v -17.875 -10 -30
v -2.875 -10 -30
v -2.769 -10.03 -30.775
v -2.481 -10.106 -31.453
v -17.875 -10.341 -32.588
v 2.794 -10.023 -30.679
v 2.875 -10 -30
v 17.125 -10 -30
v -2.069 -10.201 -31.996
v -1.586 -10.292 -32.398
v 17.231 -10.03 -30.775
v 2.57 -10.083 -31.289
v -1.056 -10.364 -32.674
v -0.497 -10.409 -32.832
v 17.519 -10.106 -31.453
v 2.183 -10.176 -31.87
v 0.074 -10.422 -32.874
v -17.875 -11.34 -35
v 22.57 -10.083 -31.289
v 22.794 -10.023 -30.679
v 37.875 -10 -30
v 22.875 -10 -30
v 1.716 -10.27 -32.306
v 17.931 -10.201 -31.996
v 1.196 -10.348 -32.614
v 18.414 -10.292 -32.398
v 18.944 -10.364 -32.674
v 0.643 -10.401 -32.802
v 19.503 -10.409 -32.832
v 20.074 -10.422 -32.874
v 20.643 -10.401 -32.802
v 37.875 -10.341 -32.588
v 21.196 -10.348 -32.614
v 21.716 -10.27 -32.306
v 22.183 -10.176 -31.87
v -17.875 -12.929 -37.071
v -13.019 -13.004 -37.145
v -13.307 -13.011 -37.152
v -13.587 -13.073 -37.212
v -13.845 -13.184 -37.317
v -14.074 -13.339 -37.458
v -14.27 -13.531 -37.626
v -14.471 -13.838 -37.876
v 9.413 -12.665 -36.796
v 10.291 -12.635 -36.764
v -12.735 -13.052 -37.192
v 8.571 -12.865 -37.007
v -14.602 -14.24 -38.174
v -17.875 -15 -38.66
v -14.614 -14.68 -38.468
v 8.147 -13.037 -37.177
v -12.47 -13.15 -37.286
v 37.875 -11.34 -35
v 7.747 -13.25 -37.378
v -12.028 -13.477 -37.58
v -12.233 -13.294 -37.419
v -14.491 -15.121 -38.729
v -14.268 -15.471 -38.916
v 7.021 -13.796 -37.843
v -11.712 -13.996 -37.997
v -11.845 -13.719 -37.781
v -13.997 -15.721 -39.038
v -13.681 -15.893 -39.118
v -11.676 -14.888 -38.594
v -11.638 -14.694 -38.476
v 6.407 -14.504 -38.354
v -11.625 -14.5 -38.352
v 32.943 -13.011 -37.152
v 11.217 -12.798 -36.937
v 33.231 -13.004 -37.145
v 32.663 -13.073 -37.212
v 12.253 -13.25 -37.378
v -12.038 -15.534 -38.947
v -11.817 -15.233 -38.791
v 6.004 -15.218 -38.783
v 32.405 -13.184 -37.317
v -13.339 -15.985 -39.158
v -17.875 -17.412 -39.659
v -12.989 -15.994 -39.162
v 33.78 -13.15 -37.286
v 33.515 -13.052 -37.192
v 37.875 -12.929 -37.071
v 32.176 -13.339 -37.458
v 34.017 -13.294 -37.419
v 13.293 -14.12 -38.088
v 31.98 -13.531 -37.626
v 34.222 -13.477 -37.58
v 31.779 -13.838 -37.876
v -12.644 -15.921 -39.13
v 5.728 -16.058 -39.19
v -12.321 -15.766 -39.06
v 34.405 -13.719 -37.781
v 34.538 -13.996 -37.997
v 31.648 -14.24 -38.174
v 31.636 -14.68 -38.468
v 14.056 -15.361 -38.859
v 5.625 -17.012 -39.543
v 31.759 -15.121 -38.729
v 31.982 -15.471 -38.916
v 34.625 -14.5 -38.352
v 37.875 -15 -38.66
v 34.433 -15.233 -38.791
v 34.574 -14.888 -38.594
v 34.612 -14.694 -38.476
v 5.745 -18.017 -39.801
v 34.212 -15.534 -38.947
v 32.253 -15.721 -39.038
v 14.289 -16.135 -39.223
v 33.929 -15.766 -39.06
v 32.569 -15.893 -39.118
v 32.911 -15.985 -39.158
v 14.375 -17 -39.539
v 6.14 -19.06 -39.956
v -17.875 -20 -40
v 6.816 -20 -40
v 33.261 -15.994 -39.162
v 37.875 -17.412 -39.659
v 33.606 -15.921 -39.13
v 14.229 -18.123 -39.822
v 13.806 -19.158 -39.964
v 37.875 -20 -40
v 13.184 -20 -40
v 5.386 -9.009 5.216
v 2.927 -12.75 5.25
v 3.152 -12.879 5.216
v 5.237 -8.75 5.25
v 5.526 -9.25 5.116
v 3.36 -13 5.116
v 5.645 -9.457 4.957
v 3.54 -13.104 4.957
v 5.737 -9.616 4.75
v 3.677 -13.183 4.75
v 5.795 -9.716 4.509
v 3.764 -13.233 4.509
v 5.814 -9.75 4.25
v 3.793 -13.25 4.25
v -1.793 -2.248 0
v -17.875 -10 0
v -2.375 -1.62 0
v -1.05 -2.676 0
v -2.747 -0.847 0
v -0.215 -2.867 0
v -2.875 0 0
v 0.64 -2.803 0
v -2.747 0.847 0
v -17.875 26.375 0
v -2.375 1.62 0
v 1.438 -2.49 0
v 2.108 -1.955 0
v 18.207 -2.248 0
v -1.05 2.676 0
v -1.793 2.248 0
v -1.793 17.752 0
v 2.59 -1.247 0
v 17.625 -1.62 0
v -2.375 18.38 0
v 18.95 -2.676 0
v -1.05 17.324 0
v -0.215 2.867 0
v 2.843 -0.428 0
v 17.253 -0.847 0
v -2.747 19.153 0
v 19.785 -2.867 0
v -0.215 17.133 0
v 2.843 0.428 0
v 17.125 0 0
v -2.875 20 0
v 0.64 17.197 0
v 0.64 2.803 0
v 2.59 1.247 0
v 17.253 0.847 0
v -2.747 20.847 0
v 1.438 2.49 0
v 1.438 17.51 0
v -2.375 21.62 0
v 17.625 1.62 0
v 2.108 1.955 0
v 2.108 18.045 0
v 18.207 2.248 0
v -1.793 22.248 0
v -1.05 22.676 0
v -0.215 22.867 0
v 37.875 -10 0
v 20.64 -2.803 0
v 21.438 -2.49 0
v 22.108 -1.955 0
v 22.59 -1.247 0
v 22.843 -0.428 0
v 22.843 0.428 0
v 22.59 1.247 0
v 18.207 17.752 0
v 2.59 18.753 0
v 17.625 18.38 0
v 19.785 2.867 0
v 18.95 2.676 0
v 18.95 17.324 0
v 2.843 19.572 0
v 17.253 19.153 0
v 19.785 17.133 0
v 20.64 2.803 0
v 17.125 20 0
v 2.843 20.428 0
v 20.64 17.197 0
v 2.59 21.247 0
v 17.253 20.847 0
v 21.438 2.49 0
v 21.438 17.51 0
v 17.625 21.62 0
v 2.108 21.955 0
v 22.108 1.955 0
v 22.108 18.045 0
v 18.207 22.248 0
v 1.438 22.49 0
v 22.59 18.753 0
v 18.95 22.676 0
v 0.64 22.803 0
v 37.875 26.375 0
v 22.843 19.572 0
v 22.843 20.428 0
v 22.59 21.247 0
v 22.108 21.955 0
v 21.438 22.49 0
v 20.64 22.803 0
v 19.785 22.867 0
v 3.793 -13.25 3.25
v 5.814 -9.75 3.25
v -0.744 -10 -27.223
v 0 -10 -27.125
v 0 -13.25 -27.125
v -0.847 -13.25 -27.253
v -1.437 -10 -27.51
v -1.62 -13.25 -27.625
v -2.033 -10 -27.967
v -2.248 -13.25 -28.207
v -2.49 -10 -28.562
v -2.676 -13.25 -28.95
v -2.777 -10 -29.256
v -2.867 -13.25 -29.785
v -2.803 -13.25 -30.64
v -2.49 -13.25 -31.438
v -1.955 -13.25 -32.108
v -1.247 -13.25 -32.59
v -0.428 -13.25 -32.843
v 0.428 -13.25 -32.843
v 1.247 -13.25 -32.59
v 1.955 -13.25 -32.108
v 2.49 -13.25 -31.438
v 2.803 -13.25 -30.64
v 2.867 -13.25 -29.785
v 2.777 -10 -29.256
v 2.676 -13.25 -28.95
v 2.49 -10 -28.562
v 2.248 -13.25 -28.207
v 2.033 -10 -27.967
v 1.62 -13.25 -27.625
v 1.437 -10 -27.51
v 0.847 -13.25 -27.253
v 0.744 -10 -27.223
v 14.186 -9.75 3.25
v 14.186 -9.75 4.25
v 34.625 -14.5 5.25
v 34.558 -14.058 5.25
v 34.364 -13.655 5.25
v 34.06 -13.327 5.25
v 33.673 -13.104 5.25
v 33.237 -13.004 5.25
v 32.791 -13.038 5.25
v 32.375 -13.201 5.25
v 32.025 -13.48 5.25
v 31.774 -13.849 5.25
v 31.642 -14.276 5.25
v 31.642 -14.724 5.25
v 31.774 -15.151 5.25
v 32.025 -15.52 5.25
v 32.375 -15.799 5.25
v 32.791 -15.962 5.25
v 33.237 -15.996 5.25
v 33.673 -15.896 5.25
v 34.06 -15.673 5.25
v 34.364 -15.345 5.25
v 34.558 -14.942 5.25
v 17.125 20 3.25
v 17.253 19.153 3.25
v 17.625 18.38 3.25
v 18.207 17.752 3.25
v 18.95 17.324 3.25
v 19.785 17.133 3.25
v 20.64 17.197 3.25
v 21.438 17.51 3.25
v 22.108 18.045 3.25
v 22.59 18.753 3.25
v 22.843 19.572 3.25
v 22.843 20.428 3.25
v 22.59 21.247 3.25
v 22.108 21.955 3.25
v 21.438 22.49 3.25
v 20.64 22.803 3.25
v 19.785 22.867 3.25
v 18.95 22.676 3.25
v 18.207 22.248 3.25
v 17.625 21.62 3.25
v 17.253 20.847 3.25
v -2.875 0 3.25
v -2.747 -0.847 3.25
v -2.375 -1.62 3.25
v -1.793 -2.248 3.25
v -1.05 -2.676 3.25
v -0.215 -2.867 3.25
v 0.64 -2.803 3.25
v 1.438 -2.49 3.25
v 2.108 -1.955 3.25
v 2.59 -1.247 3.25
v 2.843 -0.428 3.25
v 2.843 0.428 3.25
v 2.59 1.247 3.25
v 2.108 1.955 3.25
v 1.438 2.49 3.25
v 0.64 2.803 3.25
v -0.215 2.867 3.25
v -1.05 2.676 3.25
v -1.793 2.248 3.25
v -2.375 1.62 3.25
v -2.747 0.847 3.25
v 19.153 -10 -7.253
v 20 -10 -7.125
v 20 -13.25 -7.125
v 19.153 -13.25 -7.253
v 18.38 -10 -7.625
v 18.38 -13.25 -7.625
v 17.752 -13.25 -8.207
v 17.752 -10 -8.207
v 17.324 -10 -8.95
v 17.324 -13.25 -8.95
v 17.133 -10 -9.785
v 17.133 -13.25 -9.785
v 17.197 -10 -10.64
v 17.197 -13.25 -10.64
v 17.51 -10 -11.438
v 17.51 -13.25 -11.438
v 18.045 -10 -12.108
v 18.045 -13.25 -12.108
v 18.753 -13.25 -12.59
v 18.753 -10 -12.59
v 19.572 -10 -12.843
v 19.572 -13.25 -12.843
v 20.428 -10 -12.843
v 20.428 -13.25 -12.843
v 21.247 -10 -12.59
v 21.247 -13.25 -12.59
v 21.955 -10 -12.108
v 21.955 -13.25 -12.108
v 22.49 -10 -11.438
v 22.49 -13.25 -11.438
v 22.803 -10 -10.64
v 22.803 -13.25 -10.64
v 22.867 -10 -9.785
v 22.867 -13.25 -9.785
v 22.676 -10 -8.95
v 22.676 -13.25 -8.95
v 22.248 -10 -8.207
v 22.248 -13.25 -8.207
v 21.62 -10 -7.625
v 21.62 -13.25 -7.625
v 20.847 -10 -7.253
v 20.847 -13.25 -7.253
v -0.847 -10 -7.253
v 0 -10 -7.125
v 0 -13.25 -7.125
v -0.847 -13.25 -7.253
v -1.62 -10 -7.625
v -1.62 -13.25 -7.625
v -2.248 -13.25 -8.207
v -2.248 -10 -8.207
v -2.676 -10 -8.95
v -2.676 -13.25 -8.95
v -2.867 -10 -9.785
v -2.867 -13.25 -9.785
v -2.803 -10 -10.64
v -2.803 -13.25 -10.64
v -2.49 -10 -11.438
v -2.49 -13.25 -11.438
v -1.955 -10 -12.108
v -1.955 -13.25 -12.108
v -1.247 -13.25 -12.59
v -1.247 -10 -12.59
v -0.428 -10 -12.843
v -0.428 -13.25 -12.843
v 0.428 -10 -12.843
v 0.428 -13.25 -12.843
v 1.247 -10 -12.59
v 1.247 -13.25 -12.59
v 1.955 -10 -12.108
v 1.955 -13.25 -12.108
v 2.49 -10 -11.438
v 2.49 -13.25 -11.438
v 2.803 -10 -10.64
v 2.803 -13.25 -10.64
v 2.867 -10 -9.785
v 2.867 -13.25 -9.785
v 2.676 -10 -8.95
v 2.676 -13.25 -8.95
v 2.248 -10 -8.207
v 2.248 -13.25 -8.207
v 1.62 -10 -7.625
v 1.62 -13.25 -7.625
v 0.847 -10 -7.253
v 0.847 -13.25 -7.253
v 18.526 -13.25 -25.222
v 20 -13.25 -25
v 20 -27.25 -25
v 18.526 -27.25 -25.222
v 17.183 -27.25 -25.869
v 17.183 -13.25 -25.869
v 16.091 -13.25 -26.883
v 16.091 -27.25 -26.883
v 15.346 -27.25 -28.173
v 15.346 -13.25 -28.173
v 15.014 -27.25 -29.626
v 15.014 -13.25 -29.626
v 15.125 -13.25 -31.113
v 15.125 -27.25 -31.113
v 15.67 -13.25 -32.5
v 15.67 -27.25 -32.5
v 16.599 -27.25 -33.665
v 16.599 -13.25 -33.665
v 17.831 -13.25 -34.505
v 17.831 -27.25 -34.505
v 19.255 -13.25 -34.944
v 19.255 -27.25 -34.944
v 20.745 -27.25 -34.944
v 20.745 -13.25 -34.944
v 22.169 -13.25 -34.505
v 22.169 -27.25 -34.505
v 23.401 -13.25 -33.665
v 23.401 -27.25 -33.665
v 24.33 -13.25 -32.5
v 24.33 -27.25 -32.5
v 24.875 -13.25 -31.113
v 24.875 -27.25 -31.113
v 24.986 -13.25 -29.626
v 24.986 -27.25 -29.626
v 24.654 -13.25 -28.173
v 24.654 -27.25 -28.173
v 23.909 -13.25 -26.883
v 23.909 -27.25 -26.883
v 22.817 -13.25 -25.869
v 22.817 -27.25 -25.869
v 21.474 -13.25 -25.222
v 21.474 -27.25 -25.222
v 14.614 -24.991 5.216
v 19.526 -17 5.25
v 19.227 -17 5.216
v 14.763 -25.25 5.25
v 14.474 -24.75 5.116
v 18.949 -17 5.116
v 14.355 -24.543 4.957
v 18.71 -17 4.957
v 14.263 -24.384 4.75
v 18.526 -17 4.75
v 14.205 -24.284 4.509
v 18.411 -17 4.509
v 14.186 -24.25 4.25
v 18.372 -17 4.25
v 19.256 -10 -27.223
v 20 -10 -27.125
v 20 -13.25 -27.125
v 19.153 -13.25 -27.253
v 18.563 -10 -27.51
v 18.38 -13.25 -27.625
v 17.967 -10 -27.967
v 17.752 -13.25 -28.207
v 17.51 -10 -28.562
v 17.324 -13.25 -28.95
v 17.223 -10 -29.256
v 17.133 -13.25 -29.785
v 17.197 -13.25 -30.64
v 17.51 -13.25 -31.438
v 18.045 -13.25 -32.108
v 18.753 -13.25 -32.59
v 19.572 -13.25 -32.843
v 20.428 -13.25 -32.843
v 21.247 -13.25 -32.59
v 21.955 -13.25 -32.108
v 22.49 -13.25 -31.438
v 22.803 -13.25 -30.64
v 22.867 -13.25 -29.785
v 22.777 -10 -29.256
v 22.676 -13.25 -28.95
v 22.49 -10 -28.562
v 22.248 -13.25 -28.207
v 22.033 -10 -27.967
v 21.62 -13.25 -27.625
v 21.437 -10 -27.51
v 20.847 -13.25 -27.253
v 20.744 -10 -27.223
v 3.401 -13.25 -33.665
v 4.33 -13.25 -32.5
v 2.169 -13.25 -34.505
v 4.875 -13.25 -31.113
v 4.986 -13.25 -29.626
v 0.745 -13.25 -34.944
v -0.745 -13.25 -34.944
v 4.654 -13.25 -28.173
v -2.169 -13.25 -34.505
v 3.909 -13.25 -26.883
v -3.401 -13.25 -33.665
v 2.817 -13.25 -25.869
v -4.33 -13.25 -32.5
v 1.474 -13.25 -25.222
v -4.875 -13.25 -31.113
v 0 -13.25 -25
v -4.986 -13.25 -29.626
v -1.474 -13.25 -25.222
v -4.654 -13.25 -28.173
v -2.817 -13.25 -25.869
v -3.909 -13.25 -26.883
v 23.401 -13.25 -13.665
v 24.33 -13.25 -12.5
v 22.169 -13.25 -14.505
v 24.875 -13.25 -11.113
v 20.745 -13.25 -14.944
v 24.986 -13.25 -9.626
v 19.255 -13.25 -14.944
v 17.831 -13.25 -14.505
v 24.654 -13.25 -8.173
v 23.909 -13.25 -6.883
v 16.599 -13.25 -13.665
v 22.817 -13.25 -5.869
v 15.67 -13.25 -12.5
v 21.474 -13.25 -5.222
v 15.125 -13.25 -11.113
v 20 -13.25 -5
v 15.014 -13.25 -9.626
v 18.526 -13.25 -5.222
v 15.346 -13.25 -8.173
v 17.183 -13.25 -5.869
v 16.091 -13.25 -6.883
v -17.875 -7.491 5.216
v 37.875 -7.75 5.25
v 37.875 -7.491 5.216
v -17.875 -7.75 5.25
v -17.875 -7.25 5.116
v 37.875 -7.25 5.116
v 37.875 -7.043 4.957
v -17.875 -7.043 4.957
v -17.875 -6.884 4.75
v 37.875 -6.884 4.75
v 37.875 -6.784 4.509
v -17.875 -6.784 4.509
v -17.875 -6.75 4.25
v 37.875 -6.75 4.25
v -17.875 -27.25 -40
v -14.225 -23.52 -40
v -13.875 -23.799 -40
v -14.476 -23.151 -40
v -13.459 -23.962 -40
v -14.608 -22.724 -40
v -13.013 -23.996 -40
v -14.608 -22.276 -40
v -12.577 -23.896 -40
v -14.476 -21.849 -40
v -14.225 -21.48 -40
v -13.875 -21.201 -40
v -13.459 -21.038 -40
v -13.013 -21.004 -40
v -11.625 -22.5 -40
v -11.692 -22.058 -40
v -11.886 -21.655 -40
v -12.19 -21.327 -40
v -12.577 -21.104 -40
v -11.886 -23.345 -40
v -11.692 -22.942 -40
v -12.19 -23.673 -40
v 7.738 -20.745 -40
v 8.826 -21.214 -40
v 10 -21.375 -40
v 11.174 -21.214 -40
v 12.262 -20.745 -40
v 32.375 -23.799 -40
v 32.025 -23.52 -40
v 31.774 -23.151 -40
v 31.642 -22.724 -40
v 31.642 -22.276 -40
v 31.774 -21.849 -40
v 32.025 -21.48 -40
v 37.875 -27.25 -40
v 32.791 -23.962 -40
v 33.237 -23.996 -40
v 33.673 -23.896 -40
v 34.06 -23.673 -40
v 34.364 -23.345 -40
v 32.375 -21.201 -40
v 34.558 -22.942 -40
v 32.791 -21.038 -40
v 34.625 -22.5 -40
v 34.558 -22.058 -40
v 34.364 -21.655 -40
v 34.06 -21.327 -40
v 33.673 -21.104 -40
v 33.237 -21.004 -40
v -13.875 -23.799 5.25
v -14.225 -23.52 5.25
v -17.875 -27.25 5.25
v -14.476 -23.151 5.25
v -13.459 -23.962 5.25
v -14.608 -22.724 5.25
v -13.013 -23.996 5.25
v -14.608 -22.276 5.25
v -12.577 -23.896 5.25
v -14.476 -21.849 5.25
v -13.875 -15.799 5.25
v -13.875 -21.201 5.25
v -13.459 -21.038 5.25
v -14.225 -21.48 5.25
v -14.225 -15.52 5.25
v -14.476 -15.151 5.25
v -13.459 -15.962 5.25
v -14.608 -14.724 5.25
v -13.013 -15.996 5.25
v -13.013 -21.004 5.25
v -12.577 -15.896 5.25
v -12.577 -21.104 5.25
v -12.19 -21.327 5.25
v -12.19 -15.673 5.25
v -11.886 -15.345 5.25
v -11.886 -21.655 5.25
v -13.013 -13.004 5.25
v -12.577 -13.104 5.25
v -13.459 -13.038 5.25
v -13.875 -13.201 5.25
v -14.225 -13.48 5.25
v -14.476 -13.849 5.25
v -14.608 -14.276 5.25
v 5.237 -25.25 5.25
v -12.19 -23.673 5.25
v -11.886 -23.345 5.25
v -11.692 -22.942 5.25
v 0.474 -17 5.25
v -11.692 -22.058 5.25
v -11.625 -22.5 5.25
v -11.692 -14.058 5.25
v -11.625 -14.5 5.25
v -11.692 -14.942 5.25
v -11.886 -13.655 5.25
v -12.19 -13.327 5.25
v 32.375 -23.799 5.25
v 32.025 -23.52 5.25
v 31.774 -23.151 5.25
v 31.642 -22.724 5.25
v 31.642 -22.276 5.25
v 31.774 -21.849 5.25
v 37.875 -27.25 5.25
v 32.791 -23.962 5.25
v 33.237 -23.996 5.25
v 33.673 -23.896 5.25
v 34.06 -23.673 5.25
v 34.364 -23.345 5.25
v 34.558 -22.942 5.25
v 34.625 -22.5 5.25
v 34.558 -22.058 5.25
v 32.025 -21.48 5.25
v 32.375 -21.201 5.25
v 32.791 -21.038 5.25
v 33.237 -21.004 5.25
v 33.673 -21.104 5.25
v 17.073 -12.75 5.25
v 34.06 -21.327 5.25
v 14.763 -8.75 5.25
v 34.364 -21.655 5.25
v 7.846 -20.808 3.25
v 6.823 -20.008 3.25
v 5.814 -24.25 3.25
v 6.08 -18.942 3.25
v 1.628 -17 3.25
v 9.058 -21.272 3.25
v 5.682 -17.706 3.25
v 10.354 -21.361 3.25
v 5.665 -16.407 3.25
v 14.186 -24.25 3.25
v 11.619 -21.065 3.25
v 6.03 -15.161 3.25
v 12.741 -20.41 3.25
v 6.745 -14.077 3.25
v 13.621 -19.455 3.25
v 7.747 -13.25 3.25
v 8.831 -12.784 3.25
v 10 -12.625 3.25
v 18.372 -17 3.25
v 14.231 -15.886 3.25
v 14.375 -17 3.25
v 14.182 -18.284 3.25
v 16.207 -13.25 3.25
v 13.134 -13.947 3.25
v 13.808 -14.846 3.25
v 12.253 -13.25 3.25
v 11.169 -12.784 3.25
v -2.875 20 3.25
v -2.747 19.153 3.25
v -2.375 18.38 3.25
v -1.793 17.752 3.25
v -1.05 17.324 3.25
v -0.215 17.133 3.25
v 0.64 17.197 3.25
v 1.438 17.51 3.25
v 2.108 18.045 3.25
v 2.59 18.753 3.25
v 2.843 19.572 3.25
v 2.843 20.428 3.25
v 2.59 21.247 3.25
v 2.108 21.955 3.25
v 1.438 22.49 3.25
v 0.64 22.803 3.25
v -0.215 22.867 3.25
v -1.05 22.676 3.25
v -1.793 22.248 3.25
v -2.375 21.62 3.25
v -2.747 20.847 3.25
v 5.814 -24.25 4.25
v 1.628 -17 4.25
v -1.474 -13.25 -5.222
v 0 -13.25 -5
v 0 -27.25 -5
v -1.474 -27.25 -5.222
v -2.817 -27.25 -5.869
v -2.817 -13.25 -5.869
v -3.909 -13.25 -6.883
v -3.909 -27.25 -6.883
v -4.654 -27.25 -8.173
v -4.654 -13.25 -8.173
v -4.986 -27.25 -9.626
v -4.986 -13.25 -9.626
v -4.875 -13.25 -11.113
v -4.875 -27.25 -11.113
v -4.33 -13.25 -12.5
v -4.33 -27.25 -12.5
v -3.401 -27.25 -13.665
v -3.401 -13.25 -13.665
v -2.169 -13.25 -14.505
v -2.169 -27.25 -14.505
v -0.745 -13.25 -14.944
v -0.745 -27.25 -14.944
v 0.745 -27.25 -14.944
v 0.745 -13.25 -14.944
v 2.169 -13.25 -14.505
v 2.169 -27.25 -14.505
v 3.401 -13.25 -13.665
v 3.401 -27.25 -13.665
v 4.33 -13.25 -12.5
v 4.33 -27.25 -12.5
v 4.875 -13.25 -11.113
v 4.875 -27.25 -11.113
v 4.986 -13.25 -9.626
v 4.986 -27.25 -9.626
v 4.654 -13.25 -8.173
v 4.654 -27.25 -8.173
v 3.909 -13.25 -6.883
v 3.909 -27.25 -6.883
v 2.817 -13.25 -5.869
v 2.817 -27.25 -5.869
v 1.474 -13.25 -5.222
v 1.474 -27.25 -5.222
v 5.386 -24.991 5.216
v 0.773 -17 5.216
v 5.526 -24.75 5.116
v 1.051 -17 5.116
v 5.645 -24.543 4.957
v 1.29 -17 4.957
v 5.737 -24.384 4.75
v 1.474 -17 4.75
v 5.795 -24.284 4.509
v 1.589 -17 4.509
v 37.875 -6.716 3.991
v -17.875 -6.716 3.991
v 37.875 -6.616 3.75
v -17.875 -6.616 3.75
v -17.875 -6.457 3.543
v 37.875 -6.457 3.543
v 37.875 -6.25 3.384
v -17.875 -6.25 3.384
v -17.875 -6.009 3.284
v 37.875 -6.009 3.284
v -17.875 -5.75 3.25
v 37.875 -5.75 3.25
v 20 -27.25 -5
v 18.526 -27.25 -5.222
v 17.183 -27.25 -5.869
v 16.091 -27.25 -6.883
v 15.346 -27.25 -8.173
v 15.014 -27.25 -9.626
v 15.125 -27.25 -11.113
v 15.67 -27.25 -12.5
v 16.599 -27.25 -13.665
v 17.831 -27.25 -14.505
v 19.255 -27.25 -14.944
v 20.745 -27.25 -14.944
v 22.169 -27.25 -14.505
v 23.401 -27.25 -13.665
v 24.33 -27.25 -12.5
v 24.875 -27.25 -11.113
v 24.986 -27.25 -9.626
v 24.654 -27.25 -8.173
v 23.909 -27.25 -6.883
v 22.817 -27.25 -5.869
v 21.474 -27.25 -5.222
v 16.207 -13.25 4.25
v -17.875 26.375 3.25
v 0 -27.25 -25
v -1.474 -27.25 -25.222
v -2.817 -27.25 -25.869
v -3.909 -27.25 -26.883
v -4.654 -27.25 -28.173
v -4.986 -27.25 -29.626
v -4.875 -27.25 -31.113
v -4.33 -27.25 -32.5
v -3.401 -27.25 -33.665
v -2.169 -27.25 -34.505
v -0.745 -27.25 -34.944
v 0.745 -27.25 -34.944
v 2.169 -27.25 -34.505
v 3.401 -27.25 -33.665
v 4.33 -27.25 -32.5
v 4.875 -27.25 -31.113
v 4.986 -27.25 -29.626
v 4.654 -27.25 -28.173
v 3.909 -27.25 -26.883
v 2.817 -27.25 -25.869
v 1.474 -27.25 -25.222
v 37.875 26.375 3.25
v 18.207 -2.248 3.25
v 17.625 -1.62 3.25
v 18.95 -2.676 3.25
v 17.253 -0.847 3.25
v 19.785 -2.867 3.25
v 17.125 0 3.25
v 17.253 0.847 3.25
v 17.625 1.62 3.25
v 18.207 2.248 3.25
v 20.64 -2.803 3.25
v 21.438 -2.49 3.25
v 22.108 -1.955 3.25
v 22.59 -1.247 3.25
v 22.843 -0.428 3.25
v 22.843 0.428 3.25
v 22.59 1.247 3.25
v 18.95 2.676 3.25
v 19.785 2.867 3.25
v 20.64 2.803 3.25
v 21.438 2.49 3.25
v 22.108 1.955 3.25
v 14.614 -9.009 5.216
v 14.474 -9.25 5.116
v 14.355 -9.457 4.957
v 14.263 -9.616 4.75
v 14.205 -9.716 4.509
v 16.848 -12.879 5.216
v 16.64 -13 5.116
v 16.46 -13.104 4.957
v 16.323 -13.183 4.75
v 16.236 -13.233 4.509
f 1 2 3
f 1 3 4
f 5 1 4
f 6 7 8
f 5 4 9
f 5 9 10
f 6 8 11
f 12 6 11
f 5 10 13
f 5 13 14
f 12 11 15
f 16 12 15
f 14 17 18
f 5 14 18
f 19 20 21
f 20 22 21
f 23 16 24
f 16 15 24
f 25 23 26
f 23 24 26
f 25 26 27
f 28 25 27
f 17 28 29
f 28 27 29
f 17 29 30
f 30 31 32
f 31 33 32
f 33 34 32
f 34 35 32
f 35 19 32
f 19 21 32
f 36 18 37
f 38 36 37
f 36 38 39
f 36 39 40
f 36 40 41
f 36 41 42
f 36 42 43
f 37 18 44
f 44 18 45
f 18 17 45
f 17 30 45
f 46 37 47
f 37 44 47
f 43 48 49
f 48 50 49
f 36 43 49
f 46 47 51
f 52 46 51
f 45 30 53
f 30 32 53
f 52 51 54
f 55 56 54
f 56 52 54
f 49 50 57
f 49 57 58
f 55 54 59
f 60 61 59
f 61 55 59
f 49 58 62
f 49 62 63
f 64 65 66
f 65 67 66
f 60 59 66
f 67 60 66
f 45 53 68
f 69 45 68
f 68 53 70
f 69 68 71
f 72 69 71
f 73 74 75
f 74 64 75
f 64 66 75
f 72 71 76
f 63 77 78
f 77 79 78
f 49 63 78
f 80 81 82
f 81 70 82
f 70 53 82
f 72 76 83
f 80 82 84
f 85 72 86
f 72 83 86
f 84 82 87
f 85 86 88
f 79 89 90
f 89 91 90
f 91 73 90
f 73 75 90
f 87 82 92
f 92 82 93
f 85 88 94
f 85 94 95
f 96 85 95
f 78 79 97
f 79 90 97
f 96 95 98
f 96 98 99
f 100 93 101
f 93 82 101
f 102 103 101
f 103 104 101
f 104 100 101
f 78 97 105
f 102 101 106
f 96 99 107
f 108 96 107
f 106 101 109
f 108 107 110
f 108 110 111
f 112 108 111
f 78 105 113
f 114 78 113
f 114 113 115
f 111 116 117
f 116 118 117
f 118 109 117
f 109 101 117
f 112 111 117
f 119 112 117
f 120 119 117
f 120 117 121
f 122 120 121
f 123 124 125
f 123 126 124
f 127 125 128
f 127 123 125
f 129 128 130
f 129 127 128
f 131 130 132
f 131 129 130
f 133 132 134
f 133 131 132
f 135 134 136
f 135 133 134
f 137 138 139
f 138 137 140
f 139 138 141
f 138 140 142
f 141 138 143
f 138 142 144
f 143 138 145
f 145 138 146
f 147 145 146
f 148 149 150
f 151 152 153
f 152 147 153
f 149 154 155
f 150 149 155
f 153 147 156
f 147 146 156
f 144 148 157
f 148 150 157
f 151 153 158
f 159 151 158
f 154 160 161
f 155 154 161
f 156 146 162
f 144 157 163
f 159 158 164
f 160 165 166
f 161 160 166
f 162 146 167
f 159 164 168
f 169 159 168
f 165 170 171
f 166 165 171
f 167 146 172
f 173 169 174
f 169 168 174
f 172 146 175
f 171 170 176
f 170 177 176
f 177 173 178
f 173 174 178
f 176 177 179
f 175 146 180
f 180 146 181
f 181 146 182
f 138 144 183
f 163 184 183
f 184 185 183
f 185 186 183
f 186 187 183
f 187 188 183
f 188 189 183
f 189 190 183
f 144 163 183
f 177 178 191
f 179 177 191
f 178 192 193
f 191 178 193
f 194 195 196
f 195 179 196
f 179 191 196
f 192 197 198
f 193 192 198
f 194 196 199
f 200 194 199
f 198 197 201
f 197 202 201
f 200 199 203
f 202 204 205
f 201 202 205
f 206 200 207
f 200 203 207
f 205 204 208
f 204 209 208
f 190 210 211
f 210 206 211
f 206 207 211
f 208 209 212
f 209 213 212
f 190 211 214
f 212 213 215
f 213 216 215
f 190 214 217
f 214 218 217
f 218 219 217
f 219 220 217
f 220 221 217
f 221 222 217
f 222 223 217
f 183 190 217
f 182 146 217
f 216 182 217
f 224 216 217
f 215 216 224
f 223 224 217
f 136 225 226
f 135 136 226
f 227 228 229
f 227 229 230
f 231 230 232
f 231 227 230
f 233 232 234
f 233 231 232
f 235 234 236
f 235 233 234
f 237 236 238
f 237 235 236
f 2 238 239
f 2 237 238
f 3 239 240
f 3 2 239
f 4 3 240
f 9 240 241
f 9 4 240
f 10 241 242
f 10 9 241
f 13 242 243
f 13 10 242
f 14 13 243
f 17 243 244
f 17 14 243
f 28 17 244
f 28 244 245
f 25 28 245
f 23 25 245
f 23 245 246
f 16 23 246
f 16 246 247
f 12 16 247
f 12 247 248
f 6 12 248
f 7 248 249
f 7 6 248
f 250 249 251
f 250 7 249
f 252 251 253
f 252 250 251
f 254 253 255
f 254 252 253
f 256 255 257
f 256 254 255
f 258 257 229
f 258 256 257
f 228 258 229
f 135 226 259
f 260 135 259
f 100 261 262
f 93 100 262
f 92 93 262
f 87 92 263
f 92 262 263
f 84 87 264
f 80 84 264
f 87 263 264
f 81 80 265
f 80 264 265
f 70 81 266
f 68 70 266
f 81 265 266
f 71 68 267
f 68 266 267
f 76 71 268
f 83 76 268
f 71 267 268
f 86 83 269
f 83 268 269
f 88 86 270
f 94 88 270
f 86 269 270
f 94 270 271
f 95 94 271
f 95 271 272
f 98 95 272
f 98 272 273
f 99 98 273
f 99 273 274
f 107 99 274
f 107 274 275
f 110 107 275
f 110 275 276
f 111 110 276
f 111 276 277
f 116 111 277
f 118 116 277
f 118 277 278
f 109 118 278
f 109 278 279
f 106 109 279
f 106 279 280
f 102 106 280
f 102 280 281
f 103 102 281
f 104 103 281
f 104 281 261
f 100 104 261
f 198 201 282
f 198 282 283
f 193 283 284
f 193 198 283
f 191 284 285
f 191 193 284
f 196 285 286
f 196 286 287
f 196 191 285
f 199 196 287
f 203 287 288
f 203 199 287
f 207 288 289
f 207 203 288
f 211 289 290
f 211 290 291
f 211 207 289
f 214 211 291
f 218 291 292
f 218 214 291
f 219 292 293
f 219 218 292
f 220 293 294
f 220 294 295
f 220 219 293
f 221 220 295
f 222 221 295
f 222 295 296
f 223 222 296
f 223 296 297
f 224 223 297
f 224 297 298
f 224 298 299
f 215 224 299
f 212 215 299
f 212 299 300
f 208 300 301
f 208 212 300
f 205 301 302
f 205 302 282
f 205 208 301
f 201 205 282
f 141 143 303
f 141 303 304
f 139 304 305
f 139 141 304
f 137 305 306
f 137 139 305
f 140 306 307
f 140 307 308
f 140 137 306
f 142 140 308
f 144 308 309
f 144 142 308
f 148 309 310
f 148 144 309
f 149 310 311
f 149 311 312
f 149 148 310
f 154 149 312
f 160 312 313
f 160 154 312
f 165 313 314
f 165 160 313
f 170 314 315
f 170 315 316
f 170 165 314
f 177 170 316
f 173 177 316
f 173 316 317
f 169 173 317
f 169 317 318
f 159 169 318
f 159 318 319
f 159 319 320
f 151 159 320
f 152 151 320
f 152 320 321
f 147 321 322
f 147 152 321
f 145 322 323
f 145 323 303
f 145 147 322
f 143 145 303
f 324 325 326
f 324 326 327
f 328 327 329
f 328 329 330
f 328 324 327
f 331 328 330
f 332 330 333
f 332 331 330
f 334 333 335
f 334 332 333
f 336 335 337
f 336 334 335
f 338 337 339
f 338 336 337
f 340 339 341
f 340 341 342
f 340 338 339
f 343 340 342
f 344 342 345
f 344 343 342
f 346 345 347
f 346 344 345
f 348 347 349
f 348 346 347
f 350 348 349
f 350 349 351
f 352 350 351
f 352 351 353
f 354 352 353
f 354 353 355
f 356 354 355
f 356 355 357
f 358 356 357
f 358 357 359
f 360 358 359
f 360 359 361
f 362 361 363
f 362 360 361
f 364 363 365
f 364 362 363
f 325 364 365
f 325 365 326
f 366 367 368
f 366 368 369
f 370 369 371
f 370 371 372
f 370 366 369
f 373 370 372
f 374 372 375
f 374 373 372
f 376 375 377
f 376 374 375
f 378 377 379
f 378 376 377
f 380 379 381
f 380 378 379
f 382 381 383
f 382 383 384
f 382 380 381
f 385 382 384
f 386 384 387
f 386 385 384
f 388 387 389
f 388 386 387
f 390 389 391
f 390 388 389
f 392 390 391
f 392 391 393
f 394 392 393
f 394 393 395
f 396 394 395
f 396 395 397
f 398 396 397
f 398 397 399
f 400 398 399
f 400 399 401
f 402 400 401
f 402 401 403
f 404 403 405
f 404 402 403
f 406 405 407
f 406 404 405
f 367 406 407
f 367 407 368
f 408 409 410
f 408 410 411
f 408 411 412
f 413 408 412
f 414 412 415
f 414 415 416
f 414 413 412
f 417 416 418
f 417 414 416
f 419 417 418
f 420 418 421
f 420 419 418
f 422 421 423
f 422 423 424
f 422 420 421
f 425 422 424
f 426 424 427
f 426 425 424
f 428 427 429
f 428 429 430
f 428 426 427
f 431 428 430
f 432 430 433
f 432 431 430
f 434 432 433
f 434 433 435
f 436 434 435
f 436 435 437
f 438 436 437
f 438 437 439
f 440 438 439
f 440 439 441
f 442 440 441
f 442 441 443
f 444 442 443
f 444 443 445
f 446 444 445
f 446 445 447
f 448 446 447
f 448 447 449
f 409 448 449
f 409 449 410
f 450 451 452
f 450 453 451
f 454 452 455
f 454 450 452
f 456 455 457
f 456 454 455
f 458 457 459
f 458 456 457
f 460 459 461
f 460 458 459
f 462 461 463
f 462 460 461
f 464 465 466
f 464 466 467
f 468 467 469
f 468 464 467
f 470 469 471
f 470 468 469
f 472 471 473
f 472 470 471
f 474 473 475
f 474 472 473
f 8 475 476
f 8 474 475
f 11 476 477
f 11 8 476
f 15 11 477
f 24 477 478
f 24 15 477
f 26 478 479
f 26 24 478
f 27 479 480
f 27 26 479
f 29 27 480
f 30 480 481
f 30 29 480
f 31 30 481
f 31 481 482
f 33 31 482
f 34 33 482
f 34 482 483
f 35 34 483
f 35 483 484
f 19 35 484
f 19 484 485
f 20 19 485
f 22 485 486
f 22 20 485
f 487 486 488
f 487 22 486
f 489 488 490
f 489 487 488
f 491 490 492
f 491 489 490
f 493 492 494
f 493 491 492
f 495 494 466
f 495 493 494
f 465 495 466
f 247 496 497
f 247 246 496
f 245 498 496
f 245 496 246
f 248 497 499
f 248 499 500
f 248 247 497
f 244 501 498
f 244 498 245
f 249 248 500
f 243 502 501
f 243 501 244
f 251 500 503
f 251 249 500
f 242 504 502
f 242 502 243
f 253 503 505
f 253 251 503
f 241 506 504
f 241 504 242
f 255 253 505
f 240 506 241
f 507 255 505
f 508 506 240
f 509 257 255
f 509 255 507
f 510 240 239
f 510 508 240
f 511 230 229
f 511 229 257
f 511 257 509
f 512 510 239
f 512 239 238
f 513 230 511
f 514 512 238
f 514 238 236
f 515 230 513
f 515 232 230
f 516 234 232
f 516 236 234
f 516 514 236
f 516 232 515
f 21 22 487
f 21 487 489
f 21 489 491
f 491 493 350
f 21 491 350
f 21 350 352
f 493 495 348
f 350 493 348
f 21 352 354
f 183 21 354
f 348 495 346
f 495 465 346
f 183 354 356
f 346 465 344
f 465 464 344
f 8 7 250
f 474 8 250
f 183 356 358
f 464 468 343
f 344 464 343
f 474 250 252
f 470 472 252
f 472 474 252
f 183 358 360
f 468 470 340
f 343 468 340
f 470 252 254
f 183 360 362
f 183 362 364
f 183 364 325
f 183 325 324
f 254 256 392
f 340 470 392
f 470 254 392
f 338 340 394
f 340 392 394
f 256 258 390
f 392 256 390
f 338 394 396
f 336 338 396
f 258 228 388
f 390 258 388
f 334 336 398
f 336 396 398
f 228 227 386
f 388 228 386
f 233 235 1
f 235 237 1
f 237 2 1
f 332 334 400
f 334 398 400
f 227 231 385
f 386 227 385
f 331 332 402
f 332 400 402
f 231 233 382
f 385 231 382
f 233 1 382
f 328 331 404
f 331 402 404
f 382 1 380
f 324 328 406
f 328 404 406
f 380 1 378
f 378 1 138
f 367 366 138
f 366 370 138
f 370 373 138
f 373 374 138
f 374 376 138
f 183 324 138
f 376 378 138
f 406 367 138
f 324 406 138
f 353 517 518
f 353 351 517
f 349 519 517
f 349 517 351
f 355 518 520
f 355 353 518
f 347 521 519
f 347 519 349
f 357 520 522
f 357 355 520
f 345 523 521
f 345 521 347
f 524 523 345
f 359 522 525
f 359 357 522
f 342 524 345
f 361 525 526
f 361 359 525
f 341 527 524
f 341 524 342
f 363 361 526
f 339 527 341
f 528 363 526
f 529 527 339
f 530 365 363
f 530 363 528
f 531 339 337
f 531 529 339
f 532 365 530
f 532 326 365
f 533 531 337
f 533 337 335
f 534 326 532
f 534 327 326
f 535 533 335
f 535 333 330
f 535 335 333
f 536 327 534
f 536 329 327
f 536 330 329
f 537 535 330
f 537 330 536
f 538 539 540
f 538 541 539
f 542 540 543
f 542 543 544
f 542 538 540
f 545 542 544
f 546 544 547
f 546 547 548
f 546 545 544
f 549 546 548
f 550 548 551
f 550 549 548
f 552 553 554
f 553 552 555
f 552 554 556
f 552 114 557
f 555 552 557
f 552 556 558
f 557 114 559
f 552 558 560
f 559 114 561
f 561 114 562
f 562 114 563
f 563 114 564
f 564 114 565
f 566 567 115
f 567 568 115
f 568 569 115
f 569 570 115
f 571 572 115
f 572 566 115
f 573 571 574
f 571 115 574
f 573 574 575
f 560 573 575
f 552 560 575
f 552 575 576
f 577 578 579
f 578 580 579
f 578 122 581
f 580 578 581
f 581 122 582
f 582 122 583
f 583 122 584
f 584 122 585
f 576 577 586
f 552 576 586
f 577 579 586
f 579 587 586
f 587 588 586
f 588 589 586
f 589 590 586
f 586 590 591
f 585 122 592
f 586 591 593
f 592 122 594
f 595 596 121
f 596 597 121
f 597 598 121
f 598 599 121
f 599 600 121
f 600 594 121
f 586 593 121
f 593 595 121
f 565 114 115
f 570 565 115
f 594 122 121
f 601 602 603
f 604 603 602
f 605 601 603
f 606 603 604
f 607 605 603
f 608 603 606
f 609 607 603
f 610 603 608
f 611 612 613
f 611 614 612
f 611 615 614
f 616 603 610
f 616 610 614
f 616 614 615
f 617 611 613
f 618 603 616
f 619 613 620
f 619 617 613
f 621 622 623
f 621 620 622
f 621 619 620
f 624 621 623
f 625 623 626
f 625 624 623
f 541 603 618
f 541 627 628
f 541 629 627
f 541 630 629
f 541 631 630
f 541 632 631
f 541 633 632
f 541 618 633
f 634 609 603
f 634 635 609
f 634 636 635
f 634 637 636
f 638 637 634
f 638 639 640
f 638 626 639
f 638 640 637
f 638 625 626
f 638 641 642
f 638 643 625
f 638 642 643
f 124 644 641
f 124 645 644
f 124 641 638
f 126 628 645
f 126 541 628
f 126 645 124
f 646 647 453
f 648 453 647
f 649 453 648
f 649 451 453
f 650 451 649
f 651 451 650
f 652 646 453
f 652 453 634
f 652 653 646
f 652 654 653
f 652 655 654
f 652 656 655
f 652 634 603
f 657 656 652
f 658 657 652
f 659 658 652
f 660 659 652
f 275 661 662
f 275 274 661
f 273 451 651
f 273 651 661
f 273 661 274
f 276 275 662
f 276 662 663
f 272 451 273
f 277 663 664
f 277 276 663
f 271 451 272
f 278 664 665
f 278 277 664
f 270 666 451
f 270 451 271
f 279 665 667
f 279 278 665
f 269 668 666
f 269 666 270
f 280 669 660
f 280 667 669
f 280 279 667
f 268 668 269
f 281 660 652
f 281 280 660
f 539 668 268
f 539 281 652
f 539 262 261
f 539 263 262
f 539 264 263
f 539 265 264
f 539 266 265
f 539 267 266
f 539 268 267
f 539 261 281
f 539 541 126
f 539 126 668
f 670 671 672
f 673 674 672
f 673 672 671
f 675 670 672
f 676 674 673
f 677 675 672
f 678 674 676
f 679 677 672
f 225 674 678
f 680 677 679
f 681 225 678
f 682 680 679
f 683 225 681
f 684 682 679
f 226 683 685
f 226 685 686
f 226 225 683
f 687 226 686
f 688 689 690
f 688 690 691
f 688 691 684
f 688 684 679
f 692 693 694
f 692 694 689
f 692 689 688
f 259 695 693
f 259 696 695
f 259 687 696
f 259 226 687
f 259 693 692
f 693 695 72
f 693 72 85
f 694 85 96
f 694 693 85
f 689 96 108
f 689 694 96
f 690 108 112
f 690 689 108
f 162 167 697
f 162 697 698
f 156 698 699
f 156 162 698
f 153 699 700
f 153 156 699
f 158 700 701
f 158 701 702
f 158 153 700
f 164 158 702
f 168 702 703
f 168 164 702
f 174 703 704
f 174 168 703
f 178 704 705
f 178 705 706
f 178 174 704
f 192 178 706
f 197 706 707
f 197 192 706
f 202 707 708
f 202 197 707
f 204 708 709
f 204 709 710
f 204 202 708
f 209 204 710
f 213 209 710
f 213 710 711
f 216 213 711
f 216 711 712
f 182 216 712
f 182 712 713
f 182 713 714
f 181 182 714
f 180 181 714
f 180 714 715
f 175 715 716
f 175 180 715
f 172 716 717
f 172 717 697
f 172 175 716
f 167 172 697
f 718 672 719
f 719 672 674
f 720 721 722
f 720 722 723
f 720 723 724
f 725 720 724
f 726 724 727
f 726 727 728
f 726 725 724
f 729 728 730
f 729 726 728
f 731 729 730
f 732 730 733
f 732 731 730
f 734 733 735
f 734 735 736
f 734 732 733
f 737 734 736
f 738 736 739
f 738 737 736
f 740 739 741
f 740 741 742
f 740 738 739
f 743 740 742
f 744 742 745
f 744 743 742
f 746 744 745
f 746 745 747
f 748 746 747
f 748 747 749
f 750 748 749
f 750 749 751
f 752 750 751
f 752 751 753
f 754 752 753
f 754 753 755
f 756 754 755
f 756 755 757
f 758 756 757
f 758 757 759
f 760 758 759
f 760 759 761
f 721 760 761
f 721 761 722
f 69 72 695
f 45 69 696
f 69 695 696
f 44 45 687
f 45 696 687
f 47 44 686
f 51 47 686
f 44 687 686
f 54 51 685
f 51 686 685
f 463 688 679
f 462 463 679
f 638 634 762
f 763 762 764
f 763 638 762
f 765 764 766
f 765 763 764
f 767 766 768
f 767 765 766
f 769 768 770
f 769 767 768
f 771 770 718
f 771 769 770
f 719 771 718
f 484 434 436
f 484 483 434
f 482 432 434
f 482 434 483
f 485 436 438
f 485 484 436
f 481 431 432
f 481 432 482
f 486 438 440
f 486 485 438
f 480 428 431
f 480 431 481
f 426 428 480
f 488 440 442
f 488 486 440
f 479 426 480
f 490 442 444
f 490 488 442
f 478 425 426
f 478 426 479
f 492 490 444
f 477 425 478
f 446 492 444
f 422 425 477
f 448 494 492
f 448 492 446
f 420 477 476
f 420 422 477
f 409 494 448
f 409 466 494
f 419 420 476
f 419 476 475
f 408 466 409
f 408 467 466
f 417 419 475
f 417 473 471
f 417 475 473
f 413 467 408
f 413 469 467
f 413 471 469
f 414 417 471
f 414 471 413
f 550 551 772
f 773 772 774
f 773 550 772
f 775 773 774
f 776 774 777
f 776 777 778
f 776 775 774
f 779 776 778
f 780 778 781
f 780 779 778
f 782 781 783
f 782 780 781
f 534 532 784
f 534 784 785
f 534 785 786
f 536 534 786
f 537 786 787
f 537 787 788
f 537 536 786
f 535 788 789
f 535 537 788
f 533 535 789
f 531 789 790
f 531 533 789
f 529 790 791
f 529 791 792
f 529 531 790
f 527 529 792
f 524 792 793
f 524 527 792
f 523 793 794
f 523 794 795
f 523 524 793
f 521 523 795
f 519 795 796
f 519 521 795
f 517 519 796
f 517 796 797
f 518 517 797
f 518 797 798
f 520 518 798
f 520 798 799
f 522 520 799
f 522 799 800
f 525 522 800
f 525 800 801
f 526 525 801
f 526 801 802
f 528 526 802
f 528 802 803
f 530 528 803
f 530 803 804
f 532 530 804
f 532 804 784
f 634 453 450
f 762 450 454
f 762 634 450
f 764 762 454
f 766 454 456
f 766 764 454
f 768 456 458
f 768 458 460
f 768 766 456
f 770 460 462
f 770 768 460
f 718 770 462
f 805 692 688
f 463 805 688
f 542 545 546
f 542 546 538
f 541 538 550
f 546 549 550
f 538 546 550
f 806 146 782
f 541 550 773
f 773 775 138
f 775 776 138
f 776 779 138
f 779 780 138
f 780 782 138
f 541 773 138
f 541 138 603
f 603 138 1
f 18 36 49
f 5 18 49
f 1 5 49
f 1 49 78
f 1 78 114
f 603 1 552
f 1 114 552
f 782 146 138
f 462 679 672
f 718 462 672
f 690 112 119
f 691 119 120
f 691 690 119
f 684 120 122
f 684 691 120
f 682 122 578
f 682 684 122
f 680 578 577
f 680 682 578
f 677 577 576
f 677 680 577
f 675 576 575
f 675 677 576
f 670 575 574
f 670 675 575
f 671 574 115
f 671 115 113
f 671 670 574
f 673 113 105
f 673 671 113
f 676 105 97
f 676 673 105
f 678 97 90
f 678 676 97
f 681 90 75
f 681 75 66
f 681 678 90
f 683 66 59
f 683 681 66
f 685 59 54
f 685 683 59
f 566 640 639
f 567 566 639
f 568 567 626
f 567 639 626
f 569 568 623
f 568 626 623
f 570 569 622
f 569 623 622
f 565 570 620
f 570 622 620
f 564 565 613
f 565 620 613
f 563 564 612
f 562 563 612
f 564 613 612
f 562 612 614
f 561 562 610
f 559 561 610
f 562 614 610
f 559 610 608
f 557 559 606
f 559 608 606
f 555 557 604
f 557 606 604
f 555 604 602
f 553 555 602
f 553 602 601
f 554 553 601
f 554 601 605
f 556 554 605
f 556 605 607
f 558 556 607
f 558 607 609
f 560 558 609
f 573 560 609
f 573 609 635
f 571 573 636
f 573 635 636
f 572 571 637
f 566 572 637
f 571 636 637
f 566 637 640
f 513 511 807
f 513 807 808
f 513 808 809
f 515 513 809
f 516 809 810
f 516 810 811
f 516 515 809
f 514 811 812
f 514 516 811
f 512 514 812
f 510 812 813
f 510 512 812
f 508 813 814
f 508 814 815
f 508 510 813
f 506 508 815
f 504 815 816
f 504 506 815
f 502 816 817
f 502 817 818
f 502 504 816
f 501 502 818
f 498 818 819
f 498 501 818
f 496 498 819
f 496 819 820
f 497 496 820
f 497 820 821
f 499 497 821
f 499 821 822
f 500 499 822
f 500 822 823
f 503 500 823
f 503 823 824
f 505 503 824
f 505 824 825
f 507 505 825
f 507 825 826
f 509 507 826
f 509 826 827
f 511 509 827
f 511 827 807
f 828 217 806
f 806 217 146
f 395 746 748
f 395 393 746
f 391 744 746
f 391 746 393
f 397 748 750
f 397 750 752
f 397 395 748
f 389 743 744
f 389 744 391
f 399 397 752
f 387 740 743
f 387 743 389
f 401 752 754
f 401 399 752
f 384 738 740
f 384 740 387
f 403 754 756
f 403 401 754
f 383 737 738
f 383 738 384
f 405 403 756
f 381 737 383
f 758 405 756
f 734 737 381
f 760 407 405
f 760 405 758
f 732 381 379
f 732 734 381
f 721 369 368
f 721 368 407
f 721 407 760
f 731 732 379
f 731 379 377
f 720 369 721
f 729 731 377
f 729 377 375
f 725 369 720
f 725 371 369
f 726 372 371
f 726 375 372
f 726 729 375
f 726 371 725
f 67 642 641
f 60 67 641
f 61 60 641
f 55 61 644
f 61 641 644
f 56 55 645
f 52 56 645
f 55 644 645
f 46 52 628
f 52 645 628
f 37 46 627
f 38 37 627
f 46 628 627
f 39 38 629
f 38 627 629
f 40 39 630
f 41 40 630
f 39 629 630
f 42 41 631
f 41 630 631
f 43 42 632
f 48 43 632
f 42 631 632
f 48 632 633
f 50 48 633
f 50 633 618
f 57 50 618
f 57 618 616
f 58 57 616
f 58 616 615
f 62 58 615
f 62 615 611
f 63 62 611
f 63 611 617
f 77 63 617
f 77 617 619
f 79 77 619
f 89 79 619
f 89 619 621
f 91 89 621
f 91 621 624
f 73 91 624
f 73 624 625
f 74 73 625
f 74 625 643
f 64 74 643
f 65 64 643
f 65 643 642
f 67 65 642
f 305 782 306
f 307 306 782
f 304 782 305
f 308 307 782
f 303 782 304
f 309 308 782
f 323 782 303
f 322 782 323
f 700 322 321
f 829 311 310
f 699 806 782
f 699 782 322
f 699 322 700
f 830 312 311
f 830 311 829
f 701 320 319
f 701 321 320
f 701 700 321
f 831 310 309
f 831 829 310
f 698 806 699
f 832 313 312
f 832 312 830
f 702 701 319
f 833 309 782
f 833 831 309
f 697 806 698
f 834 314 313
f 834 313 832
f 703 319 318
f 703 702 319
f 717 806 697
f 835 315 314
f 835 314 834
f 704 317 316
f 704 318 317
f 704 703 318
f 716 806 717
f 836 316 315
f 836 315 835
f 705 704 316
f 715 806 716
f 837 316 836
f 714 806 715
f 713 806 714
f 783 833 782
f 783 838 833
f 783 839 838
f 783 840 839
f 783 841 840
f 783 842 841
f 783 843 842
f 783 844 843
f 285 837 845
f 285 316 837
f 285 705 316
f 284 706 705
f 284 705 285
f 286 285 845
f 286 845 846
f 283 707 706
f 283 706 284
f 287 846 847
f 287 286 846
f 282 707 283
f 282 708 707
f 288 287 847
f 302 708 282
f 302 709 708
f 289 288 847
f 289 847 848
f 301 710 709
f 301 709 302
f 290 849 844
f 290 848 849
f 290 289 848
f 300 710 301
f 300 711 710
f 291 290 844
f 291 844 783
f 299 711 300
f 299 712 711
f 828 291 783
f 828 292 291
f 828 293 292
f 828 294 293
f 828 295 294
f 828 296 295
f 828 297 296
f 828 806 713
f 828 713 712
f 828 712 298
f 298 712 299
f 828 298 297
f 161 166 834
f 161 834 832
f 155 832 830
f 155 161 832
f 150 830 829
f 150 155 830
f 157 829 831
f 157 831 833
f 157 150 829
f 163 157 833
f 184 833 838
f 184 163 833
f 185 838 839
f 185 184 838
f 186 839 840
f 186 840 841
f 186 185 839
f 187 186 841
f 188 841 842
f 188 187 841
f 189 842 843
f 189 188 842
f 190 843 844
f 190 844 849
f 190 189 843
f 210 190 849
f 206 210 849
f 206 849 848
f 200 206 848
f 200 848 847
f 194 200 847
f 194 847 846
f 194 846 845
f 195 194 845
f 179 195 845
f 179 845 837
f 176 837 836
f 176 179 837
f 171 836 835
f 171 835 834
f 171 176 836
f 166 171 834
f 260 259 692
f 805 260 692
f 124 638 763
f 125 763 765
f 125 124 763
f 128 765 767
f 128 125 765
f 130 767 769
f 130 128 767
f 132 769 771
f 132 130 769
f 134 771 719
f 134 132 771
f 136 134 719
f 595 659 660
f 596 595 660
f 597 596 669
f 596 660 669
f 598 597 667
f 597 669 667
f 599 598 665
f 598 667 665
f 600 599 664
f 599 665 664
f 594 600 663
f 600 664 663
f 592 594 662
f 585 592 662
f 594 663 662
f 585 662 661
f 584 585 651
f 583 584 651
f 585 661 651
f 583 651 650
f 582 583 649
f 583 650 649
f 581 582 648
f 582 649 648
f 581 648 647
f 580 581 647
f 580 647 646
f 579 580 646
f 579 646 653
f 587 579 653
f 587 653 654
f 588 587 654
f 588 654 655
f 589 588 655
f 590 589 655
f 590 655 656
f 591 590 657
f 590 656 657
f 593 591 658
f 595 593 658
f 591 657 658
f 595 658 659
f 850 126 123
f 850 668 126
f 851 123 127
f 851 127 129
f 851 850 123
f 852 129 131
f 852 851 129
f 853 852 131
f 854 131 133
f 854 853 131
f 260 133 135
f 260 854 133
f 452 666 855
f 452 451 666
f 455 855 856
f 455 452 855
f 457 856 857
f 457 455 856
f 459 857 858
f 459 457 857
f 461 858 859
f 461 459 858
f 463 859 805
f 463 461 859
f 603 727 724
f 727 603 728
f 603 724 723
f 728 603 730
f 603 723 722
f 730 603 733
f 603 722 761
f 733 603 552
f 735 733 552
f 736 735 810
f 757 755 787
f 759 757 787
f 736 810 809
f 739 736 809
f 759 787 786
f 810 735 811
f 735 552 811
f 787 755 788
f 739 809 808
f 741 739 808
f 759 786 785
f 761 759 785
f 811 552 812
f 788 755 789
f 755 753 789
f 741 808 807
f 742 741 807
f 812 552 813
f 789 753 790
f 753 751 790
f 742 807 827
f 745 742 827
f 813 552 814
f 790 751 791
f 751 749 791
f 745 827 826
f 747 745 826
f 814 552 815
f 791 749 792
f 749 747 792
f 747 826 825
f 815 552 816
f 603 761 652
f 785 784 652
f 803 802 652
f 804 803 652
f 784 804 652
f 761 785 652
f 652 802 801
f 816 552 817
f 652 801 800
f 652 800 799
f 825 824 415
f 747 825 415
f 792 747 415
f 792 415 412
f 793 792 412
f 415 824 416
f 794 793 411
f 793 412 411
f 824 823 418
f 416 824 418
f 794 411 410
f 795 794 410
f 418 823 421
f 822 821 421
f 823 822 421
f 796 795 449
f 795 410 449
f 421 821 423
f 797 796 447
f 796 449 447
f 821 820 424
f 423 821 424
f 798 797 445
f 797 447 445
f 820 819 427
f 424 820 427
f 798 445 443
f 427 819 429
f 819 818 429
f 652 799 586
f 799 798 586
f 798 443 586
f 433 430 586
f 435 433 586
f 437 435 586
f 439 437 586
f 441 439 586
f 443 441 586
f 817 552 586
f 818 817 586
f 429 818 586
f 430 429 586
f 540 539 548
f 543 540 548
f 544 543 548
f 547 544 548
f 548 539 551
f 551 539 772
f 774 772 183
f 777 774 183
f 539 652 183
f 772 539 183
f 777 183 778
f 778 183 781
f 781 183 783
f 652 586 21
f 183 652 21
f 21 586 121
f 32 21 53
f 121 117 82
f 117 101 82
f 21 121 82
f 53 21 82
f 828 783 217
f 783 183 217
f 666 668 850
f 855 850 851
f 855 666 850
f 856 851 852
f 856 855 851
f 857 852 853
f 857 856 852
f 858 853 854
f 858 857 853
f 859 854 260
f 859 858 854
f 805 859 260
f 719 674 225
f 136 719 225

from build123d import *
from build123d.topology import SkipClean

# Parameters (mm, degrees)
SKETCH1_R           = 2.875
SKETCH1_W           = 55.75
SKETCH1_H           = 3.25
BOSS_EXTRUDE1_DEPTH = 3.25
SKETCH1_4_W         = 55.75
SKETCH1_4_H         = 3.25
BOSS_EXTRUDE2_DEPTH = 40
CUT_EXTRUDE2_DEPTH  = 43.25
BOSS_EXTRUDE4_DEPTH = 2
BOSS_EXTRUDE5_DEPTH = 43.25
SKETCH2_R           = 5
SKETCH2_R_2         = 2.875
CUT_EXTRUDE1_DEPTH  = 17.25
FILLET1_R           = 1
SKETCH2_3_R         = 5
SKETCH2_3_R_2       = 2.875
BOSS_EXTRUDE6_DEPTH = 3.25
SKETCH4_R           = 1.5
CUT_EXTRUDE4_DEPTH  = 45.25
FILLET4_R           = 1
FILLET5_R           = 10


# Some blends are built 0.0001 mm under size
with BuildPart() as part:
    # Sketch1 → Boss-Extrude1 (new body)
    # profile 1 of 2: a face of its own
    with BuildSketch(Plane.XY):
        Polygon((-17.875, -10), (37.875, -10), (37.875, -6.375), (37.875, 26.375), (-17.875, 26.375), (-17.875, -6.375), align=None)
        with Locations(Location((20, 20, 0), (0, 0, 180))):
            Circle(SKETCH1_R, mode=Mode.SUBTRACT)
        with Locations(Location((20, 0, 0), (0, 0, 180))):
            Circle(SKETCH1_R, mode=Mode.SUBTRACT)
        with Locations(Location((0, 0, 0), (0, 0, 180))):
            Circle(SKETCH1_R, mode=Mode.SUBTRACT)
        with Locations(Location((0, 20, 0), (0, 0, 180))):
            Circle(SKETCH1_R, mode=Mode.SUBTRACT)
    # profile 2 of 2: a face of its own
    with BuildSketch(Plane.XY):
        with Locations((10, -11.625)):
            Rectangle(SKETCH1_W, SKETCH1_H)
    extrude(amount=BOSS_EXTRUDE1_DEPTH)

    # Sketch1<4> → Boss-Extrude2 (add)
    with BuildSketch(Plane.XY):
        with Locations((10, -11.625)):
            Rectangle(SKETCH1_4_W, SKETCH1_4_H)
    extrude(amount=-BOSS_EXTRUDE2_DEPTH)

    # Sketch3 → Cut-Extrude2 (cut)
    with BuildSketch(Plane.XY.offset(3.25)):
        with BuildLine():
            Line((12.253469547, -13.25), (7.746530453, -13.25))
            ThreePointArc((7.746530453, -13.25), (7.84573728, -20.807857289), (14.375, -17))
            ThreePointArc((14.375, -17), (13.807857289, -14.84573728), (12.253469547, -13.25))
        make_face()
        with BuildLine():
            ThreePointArc((12.253469547, -13.25), (10, -12.625), (7.746530453, -13.25))
            Line((7.746530453, -13.25), (12.253469547, -13.25))
        make_face()
    extrude(amount=-CUT_EXTRUDE2_DEPTH, mode=Mode.SUBTRACT)

    # Sketch3<4> → Boss-Extrude4 (add)
    with BuildSketch(Plane.XY.offset(3.25)):
        Polygon((3.793484606, -13.25), (-17.875, -13.25), (-17.875, -27.25), (37.875, -27.25), (37.875, -13.25), (16.206515394, -13.25), (18.371578903, -17), (14.185789452, -24.25), (5.814210548, -24.25), (1.628421097, -17), align=None)
        Polygon((37.875, -6.75), (-17.875, -6.75), (-17.875, -13.25), (3.793484606, -13.25), (5.814210548, -9.75), (14.185789452, -9.75), (16.206515394, -13.25), (37.875, -13.25), align=None)
    extrude(amount=BOSS_EXTRUDE4_DEPTH)

    # Sketch3<5> → Boss-Extrude5 (add)
    with SkipClean():  # the faces are left unmerged after this step: merging them gives an invalid solid
        with BuildSketch(Plane.XY.offset(3.25)):
            Polygon((3.793484606, -13.25), (-17.875, -13.25), (-17.875, -27.25), (37.875, -27.25), (37.875, -13.25), (16.206515394, -13.25), (18.371578903, -17), (14.185789452, -24.25), (5.814210548, -24.25), (1.628421097, -17), align=None)
            with BuildLine():
                Line((7.746530453, -13.25), (3.793484606, -13.25))
                Line((3.793484606, -13.25), (1.628421097, -17))
                Line((1.628421097, -17), (5.814210548, -24.25))
                Line((5.814210548, -24.25), (14.185789452, -24.25))
                Line((14.185789452, -24.25), (18.371578903, -17))
                Line((18.371578903, -17), (16.206515394, -13.25))
                Line((16.206515394, -13.25), (12.253469547, -13.25))
                ThreePointArc((12.253469547, -13.25), (13.807857289, -14.84573728), (14.375, -17))
                ThreePointArc((14.375, -17), (7.84573728, -20.807857289), (7.746530453, -13.25))
            make_face()
        extrude(amount=-BOSS_EXTRUDE5_DEPTH)

    # Sketch2 → Cut-Extrude1 (cut)
    # profile 1 of 8: a face of its own
    with SkipClean():  # the faces are left unmerged after this step: merging them gives an invalid solid
        with BuildSketch(Plane.XZ.offset(10)):
            with Locations(Location((20, -10, 0), (0, 0, 90))):
                Circle(SKETCH2_R)
            with Locations((20, -10)):
                Circle(SKETCH2_R_2, mode=Mode.SUBTRACT)
        # profile 2 of 8: a face of its own
        with BuildSketch(Plane.XZ.offset(10)):
            with Locations((20, -10)):
                Circle(SKETCH2_R_2)
        # profile 3 of 8: a face of its own
        with BuildSketch(Plane.XZ.offset(10)):
            with Locations(Location((0, -10, 0), (0, 0, 90))):
                Circle(SKETCH2_R)
            with Locations((0, -10)):
                Circle(SKETCH2_R_2, mode=Mode.SUBTRACT)
        # profile 4 of 8: a face of its own
        with BuildSketch(Plane.XZ.offset(10)):
            with Locations((0, -10)):
                Circle(SKETCH2_R_2)
        # profile 5 of 8: a face of its own
        with BuildSketch(Plane.XZ.offset(10)):
            with Locations(Location((0, -30, 0), (0, 0, 90))):
                Circle(SKETCH2_R)
            with Locations((0, -30)):
                Circle(SKETCH2_R_2, mode=Mode.SUBTRACT)
        # profile 6 of 8: a face of its own
        with BuildSketch(Plane.XZ.offset(10)):
            with Locations((0, -30)):
                Circle(SKETCH2_R_2)
        # profile 7 of 8: a face of its own
        with BuildSketch(Plane.XZ.offset(10)):
            with Locations(Location((20, -30, 0), (0, 0, 90))):
                Circle(SKETCH2_R)
            with Locations((20, -30)):
                Circle(SKETCH2_R_2, mode=Mode.SUBTRACT)
        # profile 8 of 8: a face of its own
        with BuildSketch(Plane.XZ.offset(10)):
            with Locations((20, -30)):
                Circle(SKETCH2_R_2)
        extrude(amount=CUT_EXTRUDE1_DEPTH, mode=Mode.SUBTRACT)

    # Fillet1
    fillet1_edges = [part.edges().sort_by_distance(p)[0] for p in [
        (10, -6.75, 3.25),
    ]]
    fillet(fillet1_edges, radius=FILLET1_R)
    fillet1_2_edges = [part.edges().sort_by_distance(p)[0] for p in [
        (10, -6.75, 5.25),
    ]]
    fillet(fillet1_2_edges, radius=FILLET1_R - 0.0001)  # a hair under: the kernel refuses the full size

    # Sketch2<3> → Boss-Extrude6 (add)
    # profile 1 of 4: a face of its own
    with BuildSketch(Plane.XZ.offset(10)):
        with Locations(Location((20, -10, 0), (0, 0, 90))):
            Circle(SKETCH2_3_R)
        with Locations(Location((20, -10, 0), (0, 0, 90))):
            Circle(SKETCH2_3_R_2, mode=Mode.SUBTRACT)
    # profile 2 of 4: a face of its own
    with BuildSketch(Plane.XZ.offset(10)):
        with Locations(Location((0, -10, 0), (0, 0, 90))):
            Circle(SKETCH2_3_R)
        with Locations(Location((0, -10, 0), (0, 0, 90))):
            Circle(SKETCH2_3_R_2, mode=Mode.SUBTRACT)
    # profile 3 of 4: a face of its own
    with BuildSketch(Plane.XZ.offset(10)):
        with Locations(Location((0, -30, 0), (0, 0, 90))):
            Circle(SKETCH2_3_R)
        with Locations(Location((0, -30, 0), (0, 0, 90))):
            Circle(SKETCH2_3_R_2, mode=Mode.SUBTRACT)
    # profile 4 of 4: a face of its own
    with BuildSketch(Plane.XZ.offset(10)):
        with Locations(Location((20, -30, 0), (0, 0, 90))):
            Circle(SKETCH2_3_R)
        with Locations(Location((20, -30, 0), (0, 0, 90))):
            Circle(SKETCH2_3_R_2, mode=Mode.SUBTRACT)
    extrude(amount=BOSS_EXTRUDE6_DEPTH)

    # Sketch4 → Cut-Extrude4 (cut)
    with BuildSketch(Plane.XY.offset(5.25)):
        with Locations((33.125, -22.5)):
            Circle(SKETCH4_R)
        with Locations((-13.125, -22.5)):
            Circle(SKETCH4_R)
        with Locations((-13.125, -14.5)):
            Circle(SKETCH4_R)
        with Locations((33.125, -14.5)):
            Circle(SKETCH4_R)
    extrude(amount=-CUT_EXTRUDE4_DEPTH, mode=Mode.SUBTRACT)

    # Fillet4
    fillet4_edges = [part.edges().sort_by_distance(p)[0] for p in [
        (3.721315823, -13.375, 5.25),
        (10, -9.75, 5.25),
        (16.278684177, -13.375, 5.25),
        (16.278684177, -20.625, 5.25),
        (10, -24.25, 5.25),
        (3.721315823, -20.625, 5.25),
    ]]
    fillet(fillet4_edges, radius=FILLET4_R)

    # Fillet5
    # the kernel refuses this fillet: 10 mm, written as the material it takes off along each edge
    with BuildSketch(Plane(origin=(62.875, -10, -40), x_dir=(0, -1, 0), z_dir=(-1, 0, 0))) as fillet5_piece_1:
        with BuildLine():
            CenterArc((FILLET5_R, FILLET5_R), FILLET5_R, 180, 90)
            Line((0, FILLET5_R), (0, 0))
            Line((0, 0), (FILLET5_R, 0))
        make_face()
    extrude(amount=105.75, mode=Mode.SUBTRACT)


solid = part.part
